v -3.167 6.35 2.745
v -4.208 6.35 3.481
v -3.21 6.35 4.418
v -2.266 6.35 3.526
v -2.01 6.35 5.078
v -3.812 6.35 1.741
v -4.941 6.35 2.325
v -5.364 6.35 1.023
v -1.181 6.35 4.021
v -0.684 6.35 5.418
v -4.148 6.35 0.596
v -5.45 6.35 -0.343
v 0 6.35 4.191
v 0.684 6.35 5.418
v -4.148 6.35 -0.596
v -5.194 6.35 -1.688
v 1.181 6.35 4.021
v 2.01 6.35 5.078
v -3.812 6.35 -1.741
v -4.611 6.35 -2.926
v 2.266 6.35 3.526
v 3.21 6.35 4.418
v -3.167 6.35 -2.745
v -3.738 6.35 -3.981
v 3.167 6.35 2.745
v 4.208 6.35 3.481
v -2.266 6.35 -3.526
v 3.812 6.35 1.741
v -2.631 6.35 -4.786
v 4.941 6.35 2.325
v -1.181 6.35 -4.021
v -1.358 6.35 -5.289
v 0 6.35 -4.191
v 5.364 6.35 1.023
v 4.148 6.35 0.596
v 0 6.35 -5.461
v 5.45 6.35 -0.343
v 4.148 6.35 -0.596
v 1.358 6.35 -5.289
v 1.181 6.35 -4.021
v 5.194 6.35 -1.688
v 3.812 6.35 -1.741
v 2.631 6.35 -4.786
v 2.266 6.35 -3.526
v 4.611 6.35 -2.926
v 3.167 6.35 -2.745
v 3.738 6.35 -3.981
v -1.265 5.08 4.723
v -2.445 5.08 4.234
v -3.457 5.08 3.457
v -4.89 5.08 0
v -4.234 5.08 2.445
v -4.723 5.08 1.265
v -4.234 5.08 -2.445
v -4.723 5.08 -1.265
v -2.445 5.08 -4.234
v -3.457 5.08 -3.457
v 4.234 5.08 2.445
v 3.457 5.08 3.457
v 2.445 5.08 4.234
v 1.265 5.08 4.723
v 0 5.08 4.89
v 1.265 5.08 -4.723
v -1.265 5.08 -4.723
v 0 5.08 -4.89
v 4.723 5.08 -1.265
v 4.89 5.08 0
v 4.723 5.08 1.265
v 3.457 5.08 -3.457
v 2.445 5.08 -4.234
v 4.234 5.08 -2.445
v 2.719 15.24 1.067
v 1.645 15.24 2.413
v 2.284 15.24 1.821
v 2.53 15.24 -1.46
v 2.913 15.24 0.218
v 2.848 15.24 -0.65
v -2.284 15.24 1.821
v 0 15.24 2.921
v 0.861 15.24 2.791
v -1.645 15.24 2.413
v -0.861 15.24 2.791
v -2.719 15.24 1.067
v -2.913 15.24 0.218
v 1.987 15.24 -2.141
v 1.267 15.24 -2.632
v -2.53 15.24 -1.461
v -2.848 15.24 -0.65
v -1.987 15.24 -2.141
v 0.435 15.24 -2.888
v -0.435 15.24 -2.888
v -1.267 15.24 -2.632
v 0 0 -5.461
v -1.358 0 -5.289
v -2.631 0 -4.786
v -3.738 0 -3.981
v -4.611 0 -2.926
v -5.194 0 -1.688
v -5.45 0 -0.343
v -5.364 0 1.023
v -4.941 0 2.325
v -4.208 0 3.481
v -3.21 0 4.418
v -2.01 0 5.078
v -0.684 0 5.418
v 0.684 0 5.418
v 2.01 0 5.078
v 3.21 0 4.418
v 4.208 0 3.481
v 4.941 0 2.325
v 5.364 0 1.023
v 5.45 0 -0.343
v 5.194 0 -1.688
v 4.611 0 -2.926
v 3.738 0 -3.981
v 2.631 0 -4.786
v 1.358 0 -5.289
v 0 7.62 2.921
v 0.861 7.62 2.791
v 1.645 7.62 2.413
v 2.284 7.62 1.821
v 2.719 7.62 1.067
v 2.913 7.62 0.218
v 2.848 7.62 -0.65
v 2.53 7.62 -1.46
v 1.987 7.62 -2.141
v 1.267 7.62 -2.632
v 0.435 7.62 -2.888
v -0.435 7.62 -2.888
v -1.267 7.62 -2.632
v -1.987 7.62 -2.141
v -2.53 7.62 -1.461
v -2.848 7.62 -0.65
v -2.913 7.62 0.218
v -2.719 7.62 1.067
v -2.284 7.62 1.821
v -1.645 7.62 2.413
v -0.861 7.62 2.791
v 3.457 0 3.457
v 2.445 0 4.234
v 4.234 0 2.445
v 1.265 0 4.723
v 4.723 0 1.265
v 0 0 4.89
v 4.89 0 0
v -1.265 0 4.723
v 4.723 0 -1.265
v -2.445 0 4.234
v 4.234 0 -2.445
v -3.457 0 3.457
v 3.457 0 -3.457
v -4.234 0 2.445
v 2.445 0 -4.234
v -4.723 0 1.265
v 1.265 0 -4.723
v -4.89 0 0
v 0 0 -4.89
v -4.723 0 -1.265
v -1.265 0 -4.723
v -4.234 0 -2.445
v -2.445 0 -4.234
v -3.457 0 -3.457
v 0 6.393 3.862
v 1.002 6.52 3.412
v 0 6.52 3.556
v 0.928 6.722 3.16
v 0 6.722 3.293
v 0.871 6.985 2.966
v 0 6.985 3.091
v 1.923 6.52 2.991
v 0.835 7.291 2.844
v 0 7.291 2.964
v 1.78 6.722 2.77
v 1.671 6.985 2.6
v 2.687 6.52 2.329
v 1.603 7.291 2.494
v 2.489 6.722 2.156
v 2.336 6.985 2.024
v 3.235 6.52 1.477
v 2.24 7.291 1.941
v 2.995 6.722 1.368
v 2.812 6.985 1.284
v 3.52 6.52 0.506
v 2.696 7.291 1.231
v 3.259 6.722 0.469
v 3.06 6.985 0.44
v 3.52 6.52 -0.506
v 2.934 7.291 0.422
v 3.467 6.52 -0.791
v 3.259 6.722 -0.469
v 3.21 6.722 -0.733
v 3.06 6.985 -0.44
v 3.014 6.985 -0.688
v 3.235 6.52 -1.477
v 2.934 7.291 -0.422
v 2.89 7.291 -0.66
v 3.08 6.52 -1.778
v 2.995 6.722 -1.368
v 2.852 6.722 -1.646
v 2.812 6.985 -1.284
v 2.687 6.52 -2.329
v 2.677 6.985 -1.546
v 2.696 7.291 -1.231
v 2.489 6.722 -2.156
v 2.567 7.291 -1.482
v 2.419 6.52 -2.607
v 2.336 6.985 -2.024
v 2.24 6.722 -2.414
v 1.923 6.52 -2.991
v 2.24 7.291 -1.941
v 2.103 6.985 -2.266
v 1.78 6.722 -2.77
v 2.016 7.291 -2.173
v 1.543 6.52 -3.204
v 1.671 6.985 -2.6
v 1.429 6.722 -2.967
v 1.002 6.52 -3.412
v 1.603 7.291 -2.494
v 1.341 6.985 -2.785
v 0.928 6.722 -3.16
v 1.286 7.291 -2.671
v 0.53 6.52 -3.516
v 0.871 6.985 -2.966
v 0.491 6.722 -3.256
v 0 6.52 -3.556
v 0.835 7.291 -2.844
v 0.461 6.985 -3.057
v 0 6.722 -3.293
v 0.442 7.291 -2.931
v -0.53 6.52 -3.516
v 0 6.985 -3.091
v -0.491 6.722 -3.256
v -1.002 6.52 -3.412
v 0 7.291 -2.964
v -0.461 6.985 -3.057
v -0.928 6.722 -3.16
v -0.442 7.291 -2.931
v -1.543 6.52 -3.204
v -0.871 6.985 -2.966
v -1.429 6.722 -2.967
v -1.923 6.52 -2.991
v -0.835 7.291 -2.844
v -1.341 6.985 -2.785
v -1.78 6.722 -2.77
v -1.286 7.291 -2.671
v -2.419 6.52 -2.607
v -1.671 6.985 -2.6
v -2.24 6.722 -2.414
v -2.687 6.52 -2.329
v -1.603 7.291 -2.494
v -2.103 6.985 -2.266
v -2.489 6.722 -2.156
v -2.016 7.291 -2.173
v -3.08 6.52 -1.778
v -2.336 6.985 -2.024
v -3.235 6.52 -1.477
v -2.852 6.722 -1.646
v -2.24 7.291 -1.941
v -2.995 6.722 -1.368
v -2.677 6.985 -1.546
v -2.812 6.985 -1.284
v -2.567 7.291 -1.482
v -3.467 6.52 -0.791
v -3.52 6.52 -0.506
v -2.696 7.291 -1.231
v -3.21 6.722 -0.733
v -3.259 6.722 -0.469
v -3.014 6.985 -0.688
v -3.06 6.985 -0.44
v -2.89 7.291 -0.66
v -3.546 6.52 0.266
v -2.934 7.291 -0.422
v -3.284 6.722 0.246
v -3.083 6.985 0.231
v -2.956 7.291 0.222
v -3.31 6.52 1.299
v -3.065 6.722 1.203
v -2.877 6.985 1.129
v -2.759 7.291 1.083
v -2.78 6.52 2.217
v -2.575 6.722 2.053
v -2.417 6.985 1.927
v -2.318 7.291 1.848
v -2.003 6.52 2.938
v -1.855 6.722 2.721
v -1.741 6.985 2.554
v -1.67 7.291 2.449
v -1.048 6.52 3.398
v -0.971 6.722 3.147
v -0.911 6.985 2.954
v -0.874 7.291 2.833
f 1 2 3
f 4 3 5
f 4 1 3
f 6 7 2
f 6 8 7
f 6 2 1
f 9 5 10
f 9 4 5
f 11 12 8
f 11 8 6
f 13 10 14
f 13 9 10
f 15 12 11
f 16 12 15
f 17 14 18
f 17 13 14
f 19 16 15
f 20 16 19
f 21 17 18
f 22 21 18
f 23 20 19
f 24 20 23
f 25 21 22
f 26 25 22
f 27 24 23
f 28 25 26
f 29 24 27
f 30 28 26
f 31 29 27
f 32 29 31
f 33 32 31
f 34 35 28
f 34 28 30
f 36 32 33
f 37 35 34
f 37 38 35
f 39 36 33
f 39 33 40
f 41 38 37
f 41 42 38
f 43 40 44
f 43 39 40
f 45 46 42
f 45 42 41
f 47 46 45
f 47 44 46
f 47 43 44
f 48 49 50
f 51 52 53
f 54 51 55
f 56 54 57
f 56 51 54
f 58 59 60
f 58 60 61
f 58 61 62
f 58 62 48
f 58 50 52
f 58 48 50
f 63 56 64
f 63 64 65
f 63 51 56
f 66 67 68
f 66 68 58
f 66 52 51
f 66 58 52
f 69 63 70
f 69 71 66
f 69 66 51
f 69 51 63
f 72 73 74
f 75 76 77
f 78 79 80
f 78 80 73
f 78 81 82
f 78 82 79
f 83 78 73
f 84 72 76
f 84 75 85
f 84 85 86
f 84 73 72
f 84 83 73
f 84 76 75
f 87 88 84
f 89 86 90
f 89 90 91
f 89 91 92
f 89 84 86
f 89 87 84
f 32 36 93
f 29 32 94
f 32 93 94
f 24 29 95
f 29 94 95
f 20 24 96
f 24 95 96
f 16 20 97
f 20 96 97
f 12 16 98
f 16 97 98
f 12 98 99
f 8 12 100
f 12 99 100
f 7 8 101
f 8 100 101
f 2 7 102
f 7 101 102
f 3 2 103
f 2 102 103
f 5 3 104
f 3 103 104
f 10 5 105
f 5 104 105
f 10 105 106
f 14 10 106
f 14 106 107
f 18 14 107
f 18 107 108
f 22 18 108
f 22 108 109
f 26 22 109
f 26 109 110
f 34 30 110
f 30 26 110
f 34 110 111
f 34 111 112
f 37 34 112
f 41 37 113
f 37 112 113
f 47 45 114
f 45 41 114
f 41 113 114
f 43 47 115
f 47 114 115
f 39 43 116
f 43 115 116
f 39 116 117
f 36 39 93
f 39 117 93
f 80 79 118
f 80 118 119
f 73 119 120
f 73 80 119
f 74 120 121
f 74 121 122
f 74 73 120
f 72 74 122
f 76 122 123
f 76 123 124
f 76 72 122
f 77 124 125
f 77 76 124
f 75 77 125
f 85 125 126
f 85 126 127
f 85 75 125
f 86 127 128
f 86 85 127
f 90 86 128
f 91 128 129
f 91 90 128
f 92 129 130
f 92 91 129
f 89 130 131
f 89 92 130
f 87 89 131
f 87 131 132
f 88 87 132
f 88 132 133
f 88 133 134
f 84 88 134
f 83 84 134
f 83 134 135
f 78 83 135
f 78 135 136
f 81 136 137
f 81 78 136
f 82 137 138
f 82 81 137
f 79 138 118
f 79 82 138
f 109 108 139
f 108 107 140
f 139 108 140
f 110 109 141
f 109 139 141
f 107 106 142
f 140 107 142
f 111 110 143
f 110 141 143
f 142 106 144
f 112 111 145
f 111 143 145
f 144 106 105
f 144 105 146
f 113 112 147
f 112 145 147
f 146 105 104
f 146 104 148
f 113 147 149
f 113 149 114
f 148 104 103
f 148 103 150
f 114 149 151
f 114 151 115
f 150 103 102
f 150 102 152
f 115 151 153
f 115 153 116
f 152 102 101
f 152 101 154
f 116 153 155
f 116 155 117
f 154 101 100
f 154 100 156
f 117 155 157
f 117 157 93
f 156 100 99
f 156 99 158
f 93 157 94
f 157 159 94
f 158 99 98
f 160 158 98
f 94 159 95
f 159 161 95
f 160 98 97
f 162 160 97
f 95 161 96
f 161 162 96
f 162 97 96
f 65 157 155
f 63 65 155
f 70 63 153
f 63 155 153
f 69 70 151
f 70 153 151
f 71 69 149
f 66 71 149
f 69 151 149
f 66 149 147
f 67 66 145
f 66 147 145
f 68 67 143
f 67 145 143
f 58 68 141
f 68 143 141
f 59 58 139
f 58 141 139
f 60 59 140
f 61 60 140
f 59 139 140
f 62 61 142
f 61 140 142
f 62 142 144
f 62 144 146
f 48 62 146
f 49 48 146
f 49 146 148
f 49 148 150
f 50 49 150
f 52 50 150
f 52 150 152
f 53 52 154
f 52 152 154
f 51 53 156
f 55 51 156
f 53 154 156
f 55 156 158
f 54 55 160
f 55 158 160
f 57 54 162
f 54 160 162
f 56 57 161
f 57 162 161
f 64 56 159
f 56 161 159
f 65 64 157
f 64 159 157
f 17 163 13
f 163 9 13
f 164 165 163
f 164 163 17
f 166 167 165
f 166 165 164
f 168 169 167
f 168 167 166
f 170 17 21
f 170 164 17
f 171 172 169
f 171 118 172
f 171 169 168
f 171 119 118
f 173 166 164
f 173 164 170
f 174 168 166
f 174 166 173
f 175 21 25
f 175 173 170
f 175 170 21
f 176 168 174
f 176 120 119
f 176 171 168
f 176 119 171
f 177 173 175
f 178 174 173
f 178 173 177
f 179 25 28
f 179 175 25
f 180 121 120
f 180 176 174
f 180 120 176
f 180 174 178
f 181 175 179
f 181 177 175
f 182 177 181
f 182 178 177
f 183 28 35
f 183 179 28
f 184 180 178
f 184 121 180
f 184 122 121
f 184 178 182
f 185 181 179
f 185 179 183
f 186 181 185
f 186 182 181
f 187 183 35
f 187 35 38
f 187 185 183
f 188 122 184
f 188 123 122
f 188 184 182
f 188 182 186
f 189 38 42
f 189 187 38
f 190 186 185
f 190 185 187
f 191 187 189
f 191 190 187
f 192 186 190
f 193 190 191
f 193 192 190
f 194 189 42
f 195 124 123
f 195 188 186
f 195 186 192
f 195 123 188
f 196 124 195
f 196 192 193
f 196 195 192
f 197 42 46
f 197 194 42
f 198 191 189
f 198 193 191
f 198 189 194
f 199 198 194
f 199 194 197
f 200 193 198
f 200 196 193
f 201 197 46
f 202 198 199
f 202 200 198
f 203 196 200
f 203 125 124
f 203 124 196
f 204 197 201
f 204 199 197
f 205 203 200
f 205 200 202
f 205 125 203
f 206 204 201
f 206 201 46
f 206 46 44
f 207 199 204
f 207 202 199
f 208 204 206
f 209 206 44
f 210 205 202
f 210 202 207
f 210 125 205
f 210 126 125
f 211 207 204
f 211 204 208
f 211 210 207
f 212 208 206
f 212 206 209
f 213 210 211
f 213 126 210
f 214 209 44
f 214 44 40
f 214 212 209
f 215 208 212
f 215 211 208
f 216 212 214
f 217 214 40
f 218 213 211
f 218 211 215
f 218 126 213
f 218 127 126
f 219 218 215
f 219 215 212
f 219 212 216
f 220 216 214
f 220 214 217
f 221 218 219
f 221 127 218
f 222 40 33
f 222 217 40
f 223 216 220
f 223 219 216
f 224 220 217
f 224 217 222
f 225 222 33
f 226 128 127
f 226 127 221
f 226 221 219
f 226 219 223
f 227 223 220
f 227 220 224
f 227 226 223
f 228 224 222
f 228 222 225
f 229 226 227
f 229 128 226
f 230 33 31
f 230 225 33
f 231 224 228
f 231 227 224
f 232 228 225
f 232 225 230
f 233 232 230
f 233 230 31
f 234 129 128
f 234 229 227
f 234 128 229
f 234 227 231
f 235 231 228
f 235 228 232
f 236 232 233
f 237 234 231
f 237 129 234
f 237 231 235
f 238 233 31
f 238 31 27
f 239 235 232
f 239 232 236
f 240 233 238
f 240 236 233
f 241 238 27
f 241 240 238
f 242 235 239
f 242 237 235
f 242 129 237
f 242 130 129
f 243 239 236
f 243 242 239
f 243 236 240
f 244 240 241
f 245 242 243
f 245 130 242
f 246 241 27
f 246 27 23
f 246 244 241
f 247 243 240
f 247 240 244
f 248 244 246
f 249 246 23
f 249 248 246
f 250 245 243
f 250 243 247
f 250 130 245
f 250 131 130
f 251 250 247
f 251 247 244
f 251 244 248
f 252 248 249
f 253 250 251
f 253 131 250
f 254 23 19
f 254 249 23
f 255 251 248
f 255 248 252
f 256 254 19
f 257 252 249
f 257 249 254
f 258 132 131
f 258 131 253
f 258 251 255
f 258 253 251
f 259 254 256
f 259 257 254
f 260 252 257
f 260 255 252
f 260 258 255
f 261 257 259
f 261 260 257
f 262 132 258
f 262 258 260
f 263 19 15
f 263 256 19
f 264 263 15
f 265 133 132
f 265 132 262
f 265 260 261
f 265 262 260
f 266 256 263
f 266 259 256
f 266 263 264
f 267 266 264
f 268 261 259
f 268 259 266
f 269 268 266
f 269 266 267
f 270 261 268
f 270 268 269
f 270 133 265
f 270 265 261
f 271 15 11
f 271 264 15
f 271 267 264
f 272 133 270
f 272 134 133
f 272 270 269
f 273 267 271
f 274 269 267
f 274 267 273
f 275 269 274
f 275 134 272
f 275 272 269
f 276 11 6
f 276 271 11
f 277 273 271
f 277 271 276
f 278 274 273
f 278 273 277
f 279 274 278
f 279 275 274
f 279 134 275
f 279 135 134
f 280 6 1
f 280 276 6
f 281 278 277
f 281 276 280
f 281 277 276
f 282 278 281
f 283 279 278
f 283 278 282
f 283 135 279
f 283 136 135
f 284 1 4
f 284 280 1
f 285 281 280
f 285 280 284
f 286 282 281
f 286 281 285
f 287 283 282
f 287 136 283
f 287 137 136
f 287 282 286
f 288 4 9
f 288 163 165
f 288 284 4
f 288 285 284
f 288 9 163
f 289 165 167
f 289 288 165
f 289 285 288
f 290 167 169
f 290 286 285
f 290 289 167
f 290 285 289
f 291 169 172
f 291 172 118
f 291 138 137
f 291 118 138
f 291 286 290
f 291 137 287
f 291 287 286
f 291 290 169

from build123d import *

# Parameters (mm, degrees)
SKETCH6_R           = 5.461
BOSS_EXTRUDE4_DEPTH = 15.24
SKETCH7_OUTSIDE_W   = 17.262
SKETCH7_OUTSIDE_H   = 17.262
SKETCH7_OUTSIDE_R   = 2.921
CUT_EXTRUDE2_DEPTH  = 8.89
SKETCH8_R           = 4.8895
CUT_EXTRUDE3_DEPTH  = 5.08
FILLET2_R           = 1.27


with BuildPart() as part:
    # Sketch6 → Boss-Extrude4 (new body)
    with BuildSketch(Plane(origin=(0, 0, 0), x_dir=(1, 0, 0), z_dir=(0, 1, 0))):
        with Locations(Location((0, 0, 0), (0, 0, 90))):
            Circle(SKETCH6_R)
    extrude(amount=BOSS_EXTRUDE4_DEPTH)

    # Sketch7 outside → Cut-Extrude2 (cut)
    with BuildSketch(Plane(origin=(0, 15.24, 0), x_dir=(1, 0, 0), z_dir=(0, 1, 0))):
        Rectangle(SKETCH7_OUTSIDE_W, SKETCH7_OUTSIDE_H)
        with Locations(Location((0, 0, 0), (0, 0, 270))):
            Circle(SKETCH7_OUTSIDE_R, mode=Mode.SUBTRACT)
    extrude(amount=-CUT_EXTRUDE2_DEPTH, mode=Mode.SUBTRACT)

    # Sketch8 → Cut-Extrude3 (cut)
    with BuildSketch(Plane.XZ):
        with Locations(Location((0, 0, 0), (0, 0, 270))):
            Circle(SKETCH8_R)
    extrude(amount=-CUT_EXTRUDE3_DEPTH, mode=Mode.SUBTRACT)

    # Fillet2
    fillet2_edges = [part.edges().sort_by_distance(p)[0] for p in [
        (0, 6.35, -2.921),
    ]]
    fillet(fillet2_edges, radius=FILLET2_R)


solid = part.part
